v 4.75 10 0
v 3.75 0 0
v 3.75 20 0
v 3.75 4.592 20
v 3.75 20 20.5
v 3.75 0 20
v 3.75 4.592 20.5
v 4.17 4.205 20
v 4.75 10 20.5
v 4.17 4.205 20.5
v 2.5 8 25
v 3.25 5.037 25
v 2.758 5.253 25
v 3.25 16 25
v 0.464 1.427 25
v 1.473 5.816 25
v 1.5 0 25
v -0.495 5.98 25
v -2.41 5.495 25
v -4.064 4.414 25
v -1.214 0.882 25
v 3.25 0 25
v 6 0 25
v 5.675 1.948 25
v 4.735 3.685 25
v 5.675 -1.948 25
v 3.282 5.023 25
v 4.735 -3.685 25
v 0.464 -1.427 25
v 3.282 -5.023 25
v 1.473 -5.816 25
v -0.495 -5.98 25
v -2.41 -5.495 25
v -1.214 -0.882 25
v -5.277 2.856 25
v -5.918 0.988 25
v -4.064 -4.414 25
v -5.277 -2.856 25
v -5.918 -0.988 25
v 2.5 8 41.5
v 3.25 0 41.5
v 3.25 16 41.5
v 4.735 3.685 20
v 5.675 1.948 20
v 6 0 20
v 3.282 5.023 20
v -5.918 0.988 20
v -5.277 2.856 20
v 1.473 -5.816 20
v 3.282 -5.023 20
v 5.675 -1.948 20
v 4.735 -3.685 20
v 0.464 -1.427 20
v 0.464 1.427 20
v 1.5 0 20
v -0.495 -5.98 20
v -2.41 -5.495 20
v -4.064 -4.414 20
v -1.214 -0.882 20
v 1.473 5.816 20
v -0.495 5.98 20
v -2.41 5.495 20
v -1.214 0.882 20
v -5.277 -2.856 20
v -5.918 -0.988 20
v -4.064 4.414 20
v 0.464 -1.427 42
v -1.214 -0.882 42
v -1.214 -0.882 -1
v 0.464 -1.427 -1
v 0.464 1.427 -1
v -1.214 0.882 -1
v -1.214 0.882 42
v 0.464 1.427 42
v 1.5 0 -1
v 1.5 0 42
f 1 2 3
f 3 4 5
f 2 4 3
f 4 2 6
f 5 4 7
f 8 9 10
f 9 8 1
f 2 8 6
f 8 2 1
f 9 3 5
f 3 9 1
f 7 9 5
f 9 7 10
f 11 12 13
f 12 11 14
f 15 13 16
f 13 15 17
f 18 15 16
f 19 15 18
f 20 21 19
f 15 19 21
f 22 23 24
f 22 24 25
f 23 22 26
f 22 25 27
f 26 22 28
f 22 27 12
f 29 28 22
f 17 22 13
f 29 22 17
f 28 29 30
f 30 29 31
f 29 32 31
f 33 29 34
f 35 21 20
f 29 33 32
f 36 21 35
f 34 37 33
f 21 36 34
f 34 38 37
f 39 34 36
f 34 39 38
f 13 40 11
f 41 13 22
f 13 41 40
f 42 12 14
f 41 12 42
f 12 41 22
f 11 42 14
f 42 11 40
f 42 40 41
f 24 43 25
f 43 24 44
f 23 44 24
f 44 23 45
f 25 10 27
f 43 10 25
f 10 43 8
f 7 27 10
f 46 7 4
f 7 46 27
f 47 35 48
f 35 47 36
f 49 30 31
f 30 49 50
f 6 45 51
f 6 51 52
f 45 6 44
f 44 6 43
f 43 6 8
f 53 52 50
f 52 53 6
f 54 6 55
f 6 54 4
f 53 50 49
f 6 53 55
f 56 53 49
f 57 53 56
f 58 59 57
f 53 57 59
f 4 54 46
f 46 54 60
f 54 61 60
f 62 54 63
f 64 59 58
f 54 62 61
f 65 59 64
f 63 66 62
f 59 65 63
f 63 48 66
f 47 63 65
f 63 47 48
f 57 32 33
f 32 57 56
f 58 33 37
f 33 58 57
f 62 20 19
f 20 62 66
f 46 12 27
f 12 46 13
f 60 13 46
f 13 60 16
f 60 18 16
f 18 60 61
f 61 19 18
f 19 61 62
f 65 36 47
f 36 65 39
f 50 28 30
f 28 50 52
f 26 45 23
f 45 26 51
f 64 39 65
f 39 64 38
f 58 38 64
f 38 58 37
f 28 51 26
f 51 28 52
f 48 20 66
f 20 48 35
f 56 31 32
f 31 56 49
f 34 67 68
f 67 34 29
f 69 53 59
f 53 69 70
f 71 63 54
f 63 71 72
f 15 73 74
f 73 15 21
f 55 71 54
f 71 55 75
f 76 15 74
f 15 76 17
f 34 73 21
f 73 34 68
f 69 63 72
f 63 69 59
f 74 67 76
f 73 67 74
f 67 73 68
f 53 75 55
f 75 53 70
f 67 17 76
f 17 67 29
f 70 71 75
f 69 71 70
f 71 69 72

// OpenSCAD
// Straight hose-barb reducer: 8 mm ID tubing to 5 mm ID tubing
// Print orientation: standing upright along +Z

// ---- Dimensions (mm) ----
id_8     = 8;    // 8 mm tubing inner diameter
id_5     = 5;    // 5 mm tubing inner diameter
bore     = 3;    // central through-bore diameter

// 8 mm tubing barbs: z = 0 to 20
barb_h_8 = 10;   // barb height
od_8_bot = 7.5;  // barb outer diameter at bottom
od_8_top = 9.5;  // barb outer diameter at top
overlap_8 = 0.5; // overlap into collar for a solid union

// 5 mm tubing barbs: z = 25 to 41
barb_h_5 = 8;    // barb height
od_5_bot = 6.5;  // barb outer diameter at bottom
od_5_top = 5.0;  // barb outer diameter at top
overlap_5 = 0.5; // overlap into collar for a solid union

// ---- Derived ----
barbs_8 = 2;     // number of 8 mm barbs, stacked
barbs_5 = 2;     // number of 5 mm barbs, stacked
collar_d = 12;   // collar diameter (z = 20 to 25)

// ---- Model ----
union() {
    // 8 mm barbs
    for (i = [0 : barbs_8 - 1]) {
        z0 = i * barb_h_8;
        translate([0, 0, z0])
            linear_extrude(height = barb_h_8 + overlap_8)
                polygon([
                    [od_8_bot / 2, 0],
                    [od_8_top / 2, barb_h_8],
                    [od_8_bot / 2, 2 * barb_h_8]
                ]);
    }

    // Collar
    translate([0, 0, 20])
        cylinder(d = collar_d, h = 5);

    // 5 mm barbs
    for (i = [0 : barbs_5 - 1]) {
        z0 = 25 + i * barb_h_5;
        translate([0, 0, z0])
            linear_extrude(height = barb_h_5 + overlap_5)
                polygon([
                    [od_5_bot / 2, 0],
                    [od_5_top / 2, barb_h_5],
                    [od_5_bot / 2, 2 * barb_h_5]
                ]);
    }

    // Through-bore
    translate([0, 0, -1])
        cylinder(d = bore, h = 43);
}
